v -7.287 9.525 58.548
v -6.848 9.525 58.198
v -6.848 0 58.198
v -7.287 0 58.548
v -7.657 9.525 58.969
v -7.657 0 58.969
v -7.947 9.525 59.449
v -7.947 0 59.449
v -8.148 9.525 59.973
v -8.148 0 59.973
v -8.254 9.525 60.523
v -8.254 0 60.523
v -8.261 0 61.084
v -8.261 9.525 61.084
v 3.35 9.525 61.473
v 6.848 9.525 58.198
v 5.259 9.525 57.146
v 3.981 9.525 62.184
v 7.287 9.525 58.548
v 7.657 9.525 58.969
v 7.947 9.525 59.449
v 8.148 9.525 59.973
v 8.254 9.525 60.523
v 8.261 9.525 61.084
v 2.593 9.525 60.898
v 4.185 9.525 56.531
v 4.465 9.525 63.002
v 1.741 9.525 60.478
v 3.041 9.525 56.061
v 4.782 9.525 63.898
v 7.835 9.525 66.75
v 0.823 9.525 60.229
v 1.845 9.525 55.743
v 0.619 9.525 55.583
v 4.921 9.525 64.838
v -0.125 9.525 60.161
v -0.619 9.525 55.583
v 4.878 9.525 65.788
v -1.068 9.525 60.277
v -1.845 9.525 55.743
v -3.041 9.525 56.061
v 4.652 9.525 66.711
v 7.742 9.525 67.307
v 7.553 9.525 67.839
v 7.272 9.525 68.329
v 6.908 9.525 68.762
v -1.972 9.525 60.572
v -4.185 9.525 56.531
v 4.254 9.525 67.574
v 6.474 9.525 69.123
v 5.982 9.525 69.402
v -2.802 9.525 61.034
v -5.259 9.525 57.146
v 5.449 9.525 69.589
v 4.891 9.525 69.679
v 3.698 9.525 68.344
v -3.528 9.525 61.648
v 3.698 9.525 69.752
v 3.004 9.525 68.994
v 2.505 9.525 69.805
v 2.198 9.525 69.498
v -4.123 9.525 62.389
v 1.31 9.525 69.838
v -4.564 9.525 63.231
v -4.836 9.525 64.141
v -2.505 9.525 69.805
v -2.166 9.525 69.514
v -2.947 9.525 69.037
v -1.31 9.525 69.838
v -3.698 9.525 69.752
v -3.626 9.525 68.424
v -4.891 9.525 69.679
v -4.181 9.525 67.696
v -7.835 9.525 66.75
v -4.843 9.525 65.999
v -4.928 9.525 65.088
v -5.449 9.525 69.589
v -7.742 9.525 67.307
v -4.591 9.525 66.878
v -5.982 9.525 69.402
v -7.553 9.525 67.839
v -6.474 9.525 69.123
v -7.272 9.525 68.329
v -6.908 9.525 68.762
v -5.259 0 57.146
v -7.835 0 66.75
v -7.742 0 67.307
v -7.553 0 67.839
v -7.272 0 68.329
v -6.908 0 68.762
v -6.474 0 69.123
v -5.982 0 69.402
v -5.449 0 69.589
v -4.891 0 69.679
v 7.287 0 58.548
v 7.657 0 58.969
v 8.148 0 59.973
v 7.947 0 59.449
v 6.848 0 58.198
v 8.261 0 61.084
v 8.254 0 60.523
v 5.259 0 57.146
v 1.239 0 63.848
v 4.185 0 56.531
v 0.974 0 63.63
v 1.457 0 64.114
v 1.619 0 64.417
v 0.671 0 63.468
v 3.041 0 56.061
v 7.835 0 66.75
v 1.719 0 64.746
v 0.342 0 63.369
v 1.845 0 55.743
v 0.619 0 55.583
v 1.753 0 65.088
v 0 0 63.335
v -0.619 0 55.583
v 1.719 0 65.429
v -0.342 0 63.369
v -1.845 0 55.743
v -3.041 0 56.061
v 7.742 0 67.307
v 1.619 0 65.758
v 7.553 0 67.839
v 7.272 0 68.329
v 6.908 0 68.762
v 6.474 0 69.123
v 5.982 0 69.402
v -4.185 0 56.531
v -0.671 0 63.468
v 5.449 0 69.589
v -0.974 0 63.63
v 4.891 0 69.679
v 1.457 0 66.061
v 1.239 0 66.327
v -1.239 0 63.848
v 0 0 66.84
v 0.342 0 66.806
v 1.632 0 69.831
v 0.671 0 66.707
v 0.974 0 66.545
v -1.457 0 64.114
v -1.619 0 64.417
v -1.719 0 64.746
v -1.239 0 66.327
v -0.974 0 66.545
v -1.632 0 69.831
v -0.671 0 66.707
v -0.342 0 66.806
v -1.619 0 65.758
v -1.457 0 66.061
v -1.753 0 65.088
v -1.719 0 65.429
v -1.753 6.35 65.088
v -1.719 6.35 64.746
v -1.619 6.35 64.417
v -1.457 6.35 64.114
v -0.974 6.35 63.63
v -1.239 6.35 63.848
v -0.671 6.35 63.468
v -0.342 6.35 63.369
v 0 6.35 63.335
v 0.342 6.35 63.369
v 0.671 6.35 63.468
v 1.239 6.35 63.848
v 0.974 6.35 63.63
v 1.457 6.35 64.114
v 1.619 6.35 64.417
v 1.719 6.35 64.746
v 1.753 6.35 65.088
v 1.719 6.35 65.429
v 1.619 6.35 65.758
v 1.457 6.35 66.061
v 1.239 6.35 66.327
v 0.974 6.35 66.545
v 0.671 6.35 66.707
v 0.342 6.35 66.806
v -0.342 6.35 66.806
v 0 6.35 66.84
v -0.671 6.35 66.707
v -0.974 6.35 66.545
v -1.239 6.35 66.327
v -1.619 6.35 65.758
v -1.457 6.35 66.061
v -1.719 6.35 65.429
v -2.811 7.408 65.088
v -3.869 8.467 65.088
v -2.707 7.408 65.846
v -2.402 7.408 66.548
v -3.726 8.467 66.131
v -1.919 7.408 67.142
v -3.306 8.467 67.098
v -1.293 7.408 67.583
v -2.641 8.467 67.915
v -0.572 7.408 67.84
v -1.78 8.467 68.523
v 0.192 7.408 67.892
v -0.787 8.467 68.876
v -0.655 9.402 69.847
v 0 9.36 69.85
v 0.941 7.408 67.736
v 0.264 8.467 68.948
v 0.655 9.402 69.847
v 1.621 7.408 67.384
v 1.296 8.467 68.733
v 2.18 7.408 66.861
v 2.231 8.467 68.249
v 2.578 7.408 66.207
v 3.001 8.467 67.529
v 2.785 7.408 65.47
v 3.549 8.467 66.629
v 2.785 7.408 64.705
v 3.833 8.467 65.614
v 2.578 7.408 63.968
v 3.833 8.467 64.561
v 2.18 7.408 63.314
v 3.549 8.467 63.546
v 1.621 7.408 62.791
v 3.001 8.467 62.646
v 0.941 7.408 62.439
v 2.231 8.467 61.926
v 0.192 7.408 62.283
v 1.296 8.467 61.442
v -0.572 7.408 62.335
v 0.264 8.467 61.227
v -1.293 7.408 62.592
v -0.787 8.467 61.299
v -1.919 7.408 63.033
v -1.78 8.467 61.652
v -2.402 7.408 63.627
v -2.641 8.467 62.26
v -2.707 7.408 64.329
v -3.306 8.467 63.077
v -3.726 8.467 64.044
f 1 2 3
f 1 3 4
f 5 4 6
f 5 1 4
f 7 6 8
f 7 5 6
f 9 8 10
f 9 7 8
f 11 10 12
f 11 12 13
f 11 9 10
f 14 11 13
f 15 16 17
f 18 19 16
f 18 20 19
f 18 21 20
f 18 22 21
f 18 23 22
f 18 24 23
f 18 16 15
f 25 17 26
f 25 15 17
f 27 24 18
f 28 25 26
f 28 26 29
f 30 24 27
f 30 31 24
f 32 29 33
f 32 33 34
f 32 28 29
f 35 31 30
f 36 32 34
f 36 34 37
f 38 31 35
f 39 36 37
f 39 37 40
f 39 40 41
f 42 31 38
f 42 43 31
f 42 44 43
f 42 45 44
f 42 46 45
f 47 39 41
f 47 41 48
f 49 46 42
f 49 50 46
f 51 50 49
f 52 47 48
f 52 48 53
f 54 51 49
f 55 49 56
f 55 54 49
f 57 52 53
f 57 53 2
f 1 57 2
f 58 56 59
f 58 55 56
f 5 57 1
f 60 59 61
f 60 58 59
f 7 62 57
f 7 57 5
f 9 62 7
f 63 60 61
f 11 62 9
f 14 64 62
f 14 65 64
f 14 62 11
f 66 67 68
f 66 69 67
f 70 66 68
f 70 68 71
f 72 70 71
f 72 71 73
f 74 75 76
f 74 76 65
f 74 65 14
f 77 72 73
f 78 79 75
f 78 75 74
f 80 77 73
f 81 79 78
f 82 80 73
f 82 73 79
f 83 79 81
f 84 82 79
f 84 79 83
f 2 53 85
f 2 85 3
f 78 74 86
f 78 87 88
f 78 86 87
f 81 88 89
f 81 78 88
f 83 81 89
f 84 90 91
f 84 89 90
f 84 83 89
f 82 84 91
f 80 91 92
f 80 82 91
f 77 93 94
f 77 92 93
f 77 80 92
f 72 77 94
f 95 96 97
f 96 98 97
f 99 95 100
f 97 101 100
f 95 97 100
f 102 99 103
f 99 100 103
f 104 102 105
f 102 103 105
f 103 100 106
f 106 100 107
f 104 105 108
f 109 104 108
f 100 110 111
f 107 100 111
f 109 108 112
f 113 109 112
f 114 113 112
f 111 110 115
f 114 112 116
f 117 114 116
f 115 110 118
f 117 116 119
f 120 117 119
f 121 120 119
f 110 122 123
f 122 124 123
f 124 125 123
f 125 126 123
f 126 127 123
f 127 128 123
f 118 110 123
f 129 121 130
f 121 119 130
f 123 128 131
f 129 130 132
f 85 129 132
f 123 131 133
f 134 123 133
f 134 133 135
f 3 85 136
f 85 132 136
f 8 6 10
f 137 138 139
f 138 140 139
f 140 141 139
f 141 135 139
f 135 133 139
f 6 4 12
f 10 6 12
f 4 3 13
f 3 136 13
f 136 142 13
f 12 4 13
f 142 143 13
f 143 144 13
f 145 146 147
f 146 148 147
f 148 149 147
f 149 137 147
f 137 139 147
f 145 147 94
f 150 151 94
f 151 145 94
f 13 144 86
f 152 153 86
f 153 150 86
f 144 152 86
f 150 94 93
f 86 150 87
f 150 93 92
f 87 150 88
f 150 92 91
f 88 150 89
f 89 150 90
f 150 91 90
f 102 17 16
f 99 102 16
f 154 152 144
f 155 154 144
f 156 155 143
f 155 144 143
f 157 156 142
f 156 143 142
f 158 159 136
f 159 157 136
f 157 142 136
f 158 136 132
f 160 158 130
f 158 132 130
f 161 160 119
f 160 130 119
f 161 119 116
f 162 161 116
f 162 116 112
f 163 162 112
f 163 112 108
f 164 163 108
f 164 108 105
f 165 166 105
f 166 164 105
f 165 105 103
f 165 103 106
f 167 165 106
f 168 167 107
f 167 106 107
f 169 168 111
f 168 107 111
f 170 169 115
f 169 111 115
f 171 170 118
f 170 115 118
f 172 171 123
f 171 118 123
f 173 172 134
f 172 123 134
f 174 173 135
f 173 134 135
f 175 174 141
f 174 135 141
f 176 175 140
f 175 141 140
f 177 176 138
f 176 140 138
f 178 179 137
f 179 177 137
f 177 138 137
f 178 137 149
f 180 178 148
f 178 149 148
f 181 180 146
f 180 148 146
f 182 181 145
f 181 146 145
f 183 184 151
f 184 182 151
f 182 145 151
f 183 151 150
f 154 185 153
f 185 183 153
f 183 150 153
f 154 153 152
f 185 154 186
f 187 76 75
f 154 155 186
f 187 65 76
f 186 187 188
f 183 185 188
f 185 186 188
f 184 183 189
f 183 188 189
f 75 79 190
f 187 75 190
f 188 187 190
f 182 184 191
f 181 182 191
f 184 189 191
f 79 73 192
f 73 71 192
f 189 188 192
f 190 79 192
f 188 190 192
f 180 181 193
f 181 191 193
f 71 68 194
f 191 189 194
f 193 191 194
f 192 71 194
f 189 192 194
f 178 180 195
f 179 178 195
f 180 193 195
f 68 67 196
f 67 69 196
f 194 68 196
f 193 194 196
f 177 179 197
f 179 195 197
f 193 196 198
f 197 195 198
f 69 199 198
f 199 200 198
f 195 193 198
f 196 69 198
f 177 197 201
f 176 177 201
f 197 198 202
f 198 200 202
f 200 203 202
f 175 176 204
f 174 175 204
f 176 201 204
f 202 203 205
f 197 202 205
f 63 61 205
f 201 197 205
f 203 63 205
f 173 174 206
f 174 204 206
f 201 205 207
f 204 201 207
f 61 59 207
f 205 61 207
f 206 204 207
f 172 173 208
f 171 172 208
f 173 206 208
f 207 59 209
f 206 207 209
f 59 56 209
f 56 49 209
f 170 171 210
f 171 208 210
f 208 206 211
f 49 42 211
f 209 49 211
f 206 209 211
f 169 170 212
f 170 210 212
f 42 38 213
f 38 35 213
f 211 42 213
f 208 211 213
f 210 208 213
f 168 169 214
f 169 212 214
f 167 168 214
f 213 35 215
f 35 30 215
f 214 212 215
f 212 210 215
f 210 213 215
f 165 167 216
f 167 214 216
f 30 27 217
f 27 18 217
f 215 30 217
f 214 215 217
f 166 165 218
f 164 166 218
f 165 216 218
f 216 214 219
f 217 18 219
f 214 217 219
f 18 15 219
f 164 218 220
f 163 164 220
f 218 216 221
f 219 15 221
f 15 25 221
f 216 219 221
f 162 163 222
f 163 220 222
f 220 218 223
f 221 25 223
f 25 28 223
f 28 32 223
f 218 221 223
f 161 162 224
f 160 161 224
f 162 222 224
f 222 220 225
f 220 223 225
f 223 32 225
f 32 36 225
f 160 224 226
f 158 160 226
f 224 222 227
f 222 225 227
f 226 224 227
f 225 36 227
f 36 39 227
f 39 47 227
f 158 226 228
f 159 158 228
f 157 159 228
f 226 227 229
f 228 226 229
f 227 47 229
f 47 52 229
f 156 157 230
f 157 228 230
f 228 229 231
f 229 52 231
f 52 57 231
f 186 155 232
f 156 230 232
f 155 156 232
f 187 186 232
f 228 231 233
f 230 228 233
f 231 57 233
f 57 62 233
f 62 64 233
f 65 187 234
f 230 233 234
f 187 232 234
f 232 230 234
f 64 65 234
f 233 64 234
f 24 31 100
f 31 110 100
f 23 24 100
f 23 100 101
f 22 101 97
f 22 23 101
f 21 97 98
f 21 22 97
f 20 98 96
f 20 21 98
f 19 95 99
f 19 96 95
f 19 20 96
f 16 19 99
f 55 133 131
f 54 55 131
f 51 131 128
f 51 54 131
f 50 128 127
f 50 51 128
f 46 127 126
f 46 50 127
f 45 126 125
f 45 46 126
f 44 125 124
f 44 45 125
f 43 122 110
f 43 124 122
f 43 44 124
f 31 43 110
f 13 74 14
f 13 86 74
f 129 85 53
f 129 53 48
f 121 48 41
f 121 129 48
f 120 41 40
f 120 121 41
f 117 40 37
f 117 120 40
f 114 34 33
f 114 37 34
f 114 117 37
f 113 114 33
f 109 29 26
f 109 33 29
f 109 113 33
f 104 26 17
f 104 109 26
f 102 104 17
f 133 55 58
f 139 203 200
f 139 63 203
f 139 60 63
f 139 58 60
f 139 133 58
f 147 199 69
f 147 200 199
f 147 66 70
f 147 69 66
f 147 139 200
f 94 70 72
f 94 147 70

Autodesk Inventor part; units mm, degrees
ref_plane "YZ Plane" through (0, 0, 0) normal (1, 0, 0) x (0, 1, 0)
ref_plane "XZ Plane" through (0, 0, 0) normal (0, 1, 0) x (-1, 0, 0)
ref_plane "XY Plane" through (0, 0, 0) normal (0, 0, 1) x (1, 0, 0)
sketch "Sketch1" plane through (0, 0, 0) normal (0, 1, 0) x (-1, 0, 0)
  circle A0 centre (0, 0) radius 73.025
  circle A1 centre (0, 0) radius 84.1375
  line L0 (0, 0) -> (0, 84.1375) construction
  circle A2 centre (0, 65.0875) radius 1.7526
  circle A3 centre (0, 65.0875) radius 7.9375 construction
  circle A4 centre (-61.9019, 20.1131) radius 1.7526
  circle A5 centre (-61.9019, 20.1131) radius 7.9375 construction
  circle A6 centre (-38.2575, -52.6569) radius 1.7526
  circle A7 centre (-38.2575, -52.6569) radius 7.9375 construction
  circle A8 centre (38.2575, -52.6569) radius 1.7526
  circle A9 centre (38.2575, -52.6569) radius 7.9375 construction
  circle A10 centre (61.9019, 20.1131) radius 1.7526
  circle A11 centre (61.9019, 20.1131) radius 7.9375 construction
  arc A12 (-29.3651, -56.0703) -> (-44.2517, -45.2546) centre (-38.2575, -52.6569) ccw
  line L1 (-29.3651, -56.0703) -> (-32.8726, -65.2077)
  line L2 (-44.2517, -45.2546) -> (-51.858, -51.414)
  arc A13 (44.2517, -45.2546) -> (29.3651, -56.0703) centre (38.2575, -52.6569) ccw
  line L3 (29.3651, -56.0703) -> (32.8726, -65.2077)
  line L4 (44.2517, -45.2546) -> (51.858, -51.414)
  arc A14 (-5.2592, 57.1461) -> (5.2592, 57.1461) centre (0, 65.0875) ccw
  arc A15 (55.1667, 26.8483) -> (61.9019, 10.5881) centre (61.9019, 20.1131) ccw
  line L5 (61.9019, 10.5881) -> (72.2533, 10.5881)
  line L6 (0, 0) -> (61.9019, 20.1131) construction
  line L7 (55.1667, 26.8483) -> (63.8164, 35.4981)
  arc A16 (-61.9019, 10.5881) -> (-55.1667, 26.8483) centre (-61.9019, 20.1131) ccw
  line L8 (-61.9019, 10.5881) -> (-72.2533, 10.5881)
  line L9 (-55.1667, 26.8483) -> (-63.8164, 35.4981)
  line L10 (0, 0) -> (12.6807, 71.9156) construction
  circle A17 centre (11.8537, 67.2254) radius 3.3655
  circle A18 centre (0, 0) radius 68.2625 construction
  circle A19 centre (11.8537, 67.2254) radius 4.7625 construction
  circle A20 centre (-11.8537, 67.2254) radius 3.3655
  circle A21 centre (-11.8537, 67.2254) radius 4.7625 construction
  line L11 (-5.2592, 57.1461) -> (-23.4145, 69.1694)
  line L12 (5.2592, 57.1461) -> (23.4145, 69.1694)
  line L13 (7.9375, -79.375) -> (-7.9375, -79.375)
  line L14 (-7.9375, -79.375) -> (-7.9375, -73.025)
  line L15 (-7.9375, -73.025) -> (7.9375, -73.025)
  line L16 (7.9375, -73.025) -> (7.9375, -79.375)
  line L17 (7.9375, -79.375) -> (-7.9375, -73.025) construction
  line L18 (-7.9375, -79.375) -> (7.9375, -73.025) construction
  line L19 (0, -76.2) -> (0, -84.1375) construction
  line L20 (12.7, -82.55) -> (-12.7, -82.55) construction
  line L21 (-12.7, -82.55) -> (-12.7, -69.85)
  line L22 (-12.7, -69.85) -> (12.7, -69.85)
  line L23 (12.7, -69.85) -> (12.7, -82.55)
  line L24 (12.7, -82.55) -> (-12.7, -69.85) construction
  line L25 (-12.7, -82.55) -> (12.7, -69.85) construction
  line L26 (30.7823, -63.9747) -> (51.3313, -49.045)
  line L27 (36.5014, -63.744) -> (49.3446, -54.4129)
  line L28 (53.077, -59.5502) -> (40.2339, -68.8813)
  line L29 (40.2339, -68.8813) -> (36.5014, -63.744)
  line L30 (49.3446, -54.4129) -> (53.077, -59.5502)
  line L31 (53.077, -59.5502) -> (36.5014, -63.744) construction
  line L32 (40.2339, -68.8813) -> (49.3446, -54.4129) construction
  line L33 (51.3313, -49.045) -> (58.7962, -59.3195)
  line L34 (58.7962, -59.3195) -> (38.2472, -74.2492) construction
  line L35 (38.2472, -74.2492) -> (51.3313, -49.045) construction
  line L36 (58.7962, -59.3195) -> (30.7823, -63.9747) construction
  line L37 (38.2472, -74.2492) -> (30.7823, -63.9747)
  line L38 (62.5068, -33.6633) -> (70.3558, -9.5064)
  line L39 (66.9981, -30.115) -> (71.9037, -15.017)
  line L40 (77.9429, -16.9792) -> (73.0373, -32.0772)
  line L41 (73.0373, -32.0772) -> (66.9981, -30.115)
  line L42 (71.9037, -15.017) -> (77.9429, -16.9792)
  line L43 (77.9429, -16.9792) -> (66.9981, -30.115) construction
  line L44 (73.0373, -32.0772) -> (71.9037, -15.017) construction
  line L45 (70.3558, -9.5064) -> (82.4342, -13.4309)
  line L46 (82.4342, -13.4309) -> (74.5852, -37.5878) construction
  line L47 (74.5852, -37.5878) -> (70.3558, -9.5064) construction
  line L48 (82.4342, -13.4309) -> (62.5068, -33.6633) construction
  line L49 (74.5852, -37.5878) -> (62.5068, -33.6633)
  line L50 (70.3558, 9.5064) -> (62.5068, 33.6633)
  line L51 (71.9037, 15.017) -> (66.9981, 30.115)
  line L52 (73.0373, 32.0772) -> (77.9429, 16.9792)
  line L53 (77.9429, 16.9792) -> (71.9037, 15.017)
  line L54 (66.9981, 30.115) -> (73.0373, 32.0772)
  line L55 (73.0373, 32.0772) -> (71.9037, 15.017) construction
  line L56 (77.9429, 16.9792) -> (66.9981, 30.115) construction
  line L57 (62.5068, 33.6633) -> (74.5852, 37.5878)
  line L58 (74.5852, 37.5878) -> (82.4342, 13.4309) construction
  line L59 (82.4342, 13.4309) -> (62.5068, 33.6633) construction
  line L60 (74.5852, 37.5878) -> (70.3558, 9.5064) construction
  line L61 (82.4342, 13.4309) -> (70.3558, 9.5064)
  line L62 (51.3313, 49.045) -> (30.7823, 63.9747)
  line L63 (49.3446, 54.4129) -> (36.5014, 63.744)
  line L64 (40.2339, 68.8813) -> (53.077, 59.5502)
  line L65 (53.077, 59.5502) -> (49.3446, 54.4129)
  line L66 (36.5014, 63.744) -> (40.2339, 68.8813)
  line L67 (40.2339, 68.8813) -> (49.3446, 54.4129) construction
  line L68 (53.077, 59.5502) -> (36.5014, 63.744) construction
  line L69 (30.7823, 63.9747) -> (38.2472, 74.2492)
  line L70 (38.2472, 74.2492) -> (58.7962, 59.3195) construction
  line L71 (58.7962, 59.3195) -> (30.7823, 63.9747) construction
  line L72 (38.2472, 74.2492) -> (51.3313, 49.045) construction
  line L73 (58.7962, 59.3195) -> (51.3313, 49.045)
  circle A22 centre (0, 0) radius 69.85
  line L74 (17.6671, 70.8557) -> (16.0268, 64.2769)
  line L75 (-17.6671, 70.8557) -> (-16.0268, 64.2769)
  line L76 (-38.2575, -52.6569) -> (-49.4548, -68.0687) construction
  line L77 (12.7, 69.85) -> (-12.7, 69.85)
  line L78 (7.9375, 73.025) -> (-7.9375, 73.025)
  line L79 (-7.9375, 79.375) -> (7.9375, 79.375)
  line L80 (7.9375, 79.375) -> (7.9375, 73.025)
  line L81 (-7.9375, 73.025) -> (-7.9375, 79.375)
  line L82 (-7.9375, 79.375) -> (7.9375, 73.025) construction
  line L83 (7.9375, 79.375) -> (-7.9375, 73.025) construction
  line L84 (-12.7, 69.85) -> (-12.7, 82.55)
  line L85 (-12.7, 82.55) -> (12.7, 82.55) construction
  line L86 (12.7, 82.55) -> (-12.7, 69.85) construction
  line L87 (-12.7, 82.55) -> (12.7, 69.85) construction
  line L88 (12.7, 82.55) -> (12.7, 69.85)
  line L89 (-30.7823, 63.9747) -> (-51.3313, 49.045)
  line L90 (-36.5014, 63.744) -> (-49.3446, 54.4129)
  line L91 (-53.077, 59.5502) -> (-40.2339, 68.8813)
  line L92 (-40.2339, 68.8813) -> (-36.5014, 63.744)
  line L93 (-49.3446, 54.4129) -> (-53.077, 59.5502)
  line L94 (-53.077, 59.5502) -> (-36.5014, 63.744) construction
  line L95 (-40.2339, 68.8813) -> (-49.3446, 54.4129) construction
  line L96 (-51.3313, 49.045) -> (-58.7962, 59.3195)
  line L97 (-58.7962, 59.3195) -> (-38.2472, 74.2492) construction
  line L98 (-38.2472, 74.2492) -> (-51.3313, 49.045) construction
  line L99 (-58.7962, 59.3195) -> (-30.7823, 63.9747) construction
  line L100 (-38.2472, 74.2492) -> (-30.7823, 63.9747)
  line L101 (-62.5068, 33.6633) -> (-70.3558, 9.5064)
  line L102 (-66.9981, 30.115) -> (-71.9037, 15.017)
  line L103 (-77.9429, 16.9792) -> (-73.0373, 32.0772)
  line L104 (-73.0373, 32.0772) -> (-66.9981, 30.115)
  line L105 (-71.9037, 15.017) -> (-77.9429, 16.9792)
  line L106 (-77.9429, 16.9792) -> (-66.9981, 30.115) construction
  line L107 (-73.0373, 32.0772) -> (-71.9037, 15.017) construction
  line L108 (-70.3558, 9.5064) -> (-82.4342, 13.4309)
  line L109 (-82.4342, 13.4309) -> (-74.5852, 37.5878) construction
  line L110 (-74.5852, 37.5878) -> (-70.3558, 9.5064) construction
  line L111 (-82.4342, 13.4309) -> (-62.5068, 33.6633) construction
  line L112 (-74.5852, 37.5878) -> (-62.5068, 33.6633)
  line L113 (-70.3558, -9.5064) -> (-62.5068, -33.6633)
  line L114 (-71.9037, -15.017) -> (-66.9981, -30.115)
  line L115 (-73.0373, -32.0772) -> (-77.9429, -16.9792)
  line L116 (-77.9429, -16.9792) -> (-71.9037, -15.017)
  line L117 (-66.9981, -30.115) -> (-73.0373, -32.0772)
  line L118 (-73.0373, -32.0772) -> (-71.9037, -15.017) construction
  line L119 (-77.9429, -16.9792) -> (-66.9981, -30.115) construction
  line L120 (-62.5068, -33.6633) -> (-74.5852, -37.5878)
  line L121 (-74.5852, -37.5878) -> (-82.4342, -13.4309) construction
  line L122 (-82.4342, -13.4309) -> (-62.5068, -33.6633) construction
  line L123 (-74.5852, -37.5878) -> (-70.3558, -9.5064) construction
  line L124 (-82.4342, -13.4309) -> (-70.3558, -9.5064)
  line L125 (-51.3313, -49.045) -> (-30.7823, -63.9747)
  line L126 (-49.3446, -54.4129) -> (-36.5014, -63.744)
  line L127 (-40.2339, -68.8813) -> (-53.077, -59.5502)
  line L128 (-53.077, -59.5502) -> (-49.3446, -54.4129)
  line L129 (-36.5014, -63.744) -> (-40.2339, -68.8813)
  line L130 (-40.2339, -68.8813) -> (-49.3446, -54.4129) construction
  line L131 (-53.077, -59.5502) -> (-36.5014, -63.744) construction
  line L132 (-30.7823, -63.9747) -> (-38.2472, -74.2492)
  line L133 (-38.2472, -74.2492) -> (-58.7962, -59.3195) construction
  line L134 (-58.7962, -59.3195) -> (-30.7823, -63.9747) construction
  line L135 (-38.2472, -74.2492) -> (-51.3313, -49.045) construction
  line L136 (-58.7962, -59.3195) -> (-51.3313, -49.045)
  line L137 (7.633, 69.4317) -> (8.401, 59.2267)
  line L138 (-7.633, 69.4317) -> (-8.401, 59.2267)
  point P0 (51.858, -51.414)
  point P1 (64.5887, 34.0727)
  point P2 (44.7892, -61.6471)
  point P3 (72.4705, -23.5471)
  point P4 (72.4705, 23.5471)
  point P5 (44.7892, 61.6471)
  point P6 (12.7, -71.9122)
  point P7 (-12.7, -71.9122)
  point P8 (31.9944, 65.643)
  point P9 (52.5434, 50.7133)
  point P10 (64.468, 34.3005)
  point P11 (72.3171, 10.1437)
  point P12 (72.3171, -10.1437)
  point P13 (64.468, -34.3005)
  point P14 (52.5434, -50.7133)
  point P15 (31.9944, -65.643)
  point P16 (66.4313, 21.5848)
  point P17 (-20.018, 66.9201)
  point P18 (-61.4776, 33.1592)
  point P19 (20.018, 66.9201)
  point P20 (66.4313, -21.5848)
  point P21 (61.4776, 33.1592)
  point P22 (41.0568, -56.5098)
  point P23 (69.0428, 10.5881)
  point P24 (49.3775, -49.4053)
  point P25 (41.0568, 56.5098)
  point P26 (-69.0428, 10.5881)
  point P27 (-49.3775, -49.4053)
  point P28 (31.7288, -62.2279)
  point P29 (0, -69.85)
  point P30 (-31.7288, -62.2279)
  point P31 (0, 76.2)
  point P32 (-44.7892, 61.6471)
  point P33 (-72.4705, 23.5471)
  point P34 (-72.4705, -23.5471)
  point P35 (-44.7892, -61.6471)
  point P36 (32.0467, -63.0561)
  point P37 (50.0669, -49.9636)
  point P38 (70.0043, 10.5881)
  point P39 (62.7968, 32.7708)
  point P40 (12.7, 71.9122)
  point P41 (12.7, 70.4828)
  point P42 (9.1625, 69.2464)
  point P43 (-9.1625, 69.2464)
  point P44 (-12.7, 70.4828)
  point P45 (-12.7, 71.9122)
  point P46 (16.899, 67.775)
  point P47 (15.0737, 68.2041)
  point P48 (-15.0737, 68.2041)
  point P49 (-16.899, 67.775)
  dimension "d1" = 146.05
  dimension "d13" = 136.525
  dimension "d14" = 9.525
  dimension "d78" = 3.175
  dimension "d0" = 11.1125
  dimension "d2" = 3.5052
  dimension "d3" = 15.875
  dimension "d6" = 360
  dimension "d8" = 19.05
  dimension "d9" = 19.05
  dimension "d10" = 19.05
  dimension "d11" = 10
  dimension "d12" = 6.731
  dimension "d34" = 15.875
  dimension "d35" = 6.35
  dimension "d37" = 25.4
  dimension "d39" = 3.175
  dimension "d42" = 360
  dimension "d151" = 76.2
  dimension "d153" = 15
  dimension "d163" = 90
extrude "Extrusion1" add sketch "Sketch1" along normal blind 9.525 contours L12 A14 L11 L138 A22 L137
fillet "Fillet14" radius 3.175 4 edges at (-7.633, 4.7625, 69.4317) (-8.401, 4.7625, 59.2267) (8.401, 4.7625, 59.2267) (7.633, 4.7625, 69.4317)
chamfer "Chamfer15" distance 3.175 angle 45 1 edges at (1.7526, 9.525, 65.0875)
equation "\"d1\" = Ring_ID"
equation "\"BearingTol\" = 0.1"
equation "\"CSDepth\" = 1.7272"
equation "\"CSAngle\" = 41deg"
equation "\"Ring_ID\" = 146.05"
properties part number "Retaining Ring" material "UHMW, White"
